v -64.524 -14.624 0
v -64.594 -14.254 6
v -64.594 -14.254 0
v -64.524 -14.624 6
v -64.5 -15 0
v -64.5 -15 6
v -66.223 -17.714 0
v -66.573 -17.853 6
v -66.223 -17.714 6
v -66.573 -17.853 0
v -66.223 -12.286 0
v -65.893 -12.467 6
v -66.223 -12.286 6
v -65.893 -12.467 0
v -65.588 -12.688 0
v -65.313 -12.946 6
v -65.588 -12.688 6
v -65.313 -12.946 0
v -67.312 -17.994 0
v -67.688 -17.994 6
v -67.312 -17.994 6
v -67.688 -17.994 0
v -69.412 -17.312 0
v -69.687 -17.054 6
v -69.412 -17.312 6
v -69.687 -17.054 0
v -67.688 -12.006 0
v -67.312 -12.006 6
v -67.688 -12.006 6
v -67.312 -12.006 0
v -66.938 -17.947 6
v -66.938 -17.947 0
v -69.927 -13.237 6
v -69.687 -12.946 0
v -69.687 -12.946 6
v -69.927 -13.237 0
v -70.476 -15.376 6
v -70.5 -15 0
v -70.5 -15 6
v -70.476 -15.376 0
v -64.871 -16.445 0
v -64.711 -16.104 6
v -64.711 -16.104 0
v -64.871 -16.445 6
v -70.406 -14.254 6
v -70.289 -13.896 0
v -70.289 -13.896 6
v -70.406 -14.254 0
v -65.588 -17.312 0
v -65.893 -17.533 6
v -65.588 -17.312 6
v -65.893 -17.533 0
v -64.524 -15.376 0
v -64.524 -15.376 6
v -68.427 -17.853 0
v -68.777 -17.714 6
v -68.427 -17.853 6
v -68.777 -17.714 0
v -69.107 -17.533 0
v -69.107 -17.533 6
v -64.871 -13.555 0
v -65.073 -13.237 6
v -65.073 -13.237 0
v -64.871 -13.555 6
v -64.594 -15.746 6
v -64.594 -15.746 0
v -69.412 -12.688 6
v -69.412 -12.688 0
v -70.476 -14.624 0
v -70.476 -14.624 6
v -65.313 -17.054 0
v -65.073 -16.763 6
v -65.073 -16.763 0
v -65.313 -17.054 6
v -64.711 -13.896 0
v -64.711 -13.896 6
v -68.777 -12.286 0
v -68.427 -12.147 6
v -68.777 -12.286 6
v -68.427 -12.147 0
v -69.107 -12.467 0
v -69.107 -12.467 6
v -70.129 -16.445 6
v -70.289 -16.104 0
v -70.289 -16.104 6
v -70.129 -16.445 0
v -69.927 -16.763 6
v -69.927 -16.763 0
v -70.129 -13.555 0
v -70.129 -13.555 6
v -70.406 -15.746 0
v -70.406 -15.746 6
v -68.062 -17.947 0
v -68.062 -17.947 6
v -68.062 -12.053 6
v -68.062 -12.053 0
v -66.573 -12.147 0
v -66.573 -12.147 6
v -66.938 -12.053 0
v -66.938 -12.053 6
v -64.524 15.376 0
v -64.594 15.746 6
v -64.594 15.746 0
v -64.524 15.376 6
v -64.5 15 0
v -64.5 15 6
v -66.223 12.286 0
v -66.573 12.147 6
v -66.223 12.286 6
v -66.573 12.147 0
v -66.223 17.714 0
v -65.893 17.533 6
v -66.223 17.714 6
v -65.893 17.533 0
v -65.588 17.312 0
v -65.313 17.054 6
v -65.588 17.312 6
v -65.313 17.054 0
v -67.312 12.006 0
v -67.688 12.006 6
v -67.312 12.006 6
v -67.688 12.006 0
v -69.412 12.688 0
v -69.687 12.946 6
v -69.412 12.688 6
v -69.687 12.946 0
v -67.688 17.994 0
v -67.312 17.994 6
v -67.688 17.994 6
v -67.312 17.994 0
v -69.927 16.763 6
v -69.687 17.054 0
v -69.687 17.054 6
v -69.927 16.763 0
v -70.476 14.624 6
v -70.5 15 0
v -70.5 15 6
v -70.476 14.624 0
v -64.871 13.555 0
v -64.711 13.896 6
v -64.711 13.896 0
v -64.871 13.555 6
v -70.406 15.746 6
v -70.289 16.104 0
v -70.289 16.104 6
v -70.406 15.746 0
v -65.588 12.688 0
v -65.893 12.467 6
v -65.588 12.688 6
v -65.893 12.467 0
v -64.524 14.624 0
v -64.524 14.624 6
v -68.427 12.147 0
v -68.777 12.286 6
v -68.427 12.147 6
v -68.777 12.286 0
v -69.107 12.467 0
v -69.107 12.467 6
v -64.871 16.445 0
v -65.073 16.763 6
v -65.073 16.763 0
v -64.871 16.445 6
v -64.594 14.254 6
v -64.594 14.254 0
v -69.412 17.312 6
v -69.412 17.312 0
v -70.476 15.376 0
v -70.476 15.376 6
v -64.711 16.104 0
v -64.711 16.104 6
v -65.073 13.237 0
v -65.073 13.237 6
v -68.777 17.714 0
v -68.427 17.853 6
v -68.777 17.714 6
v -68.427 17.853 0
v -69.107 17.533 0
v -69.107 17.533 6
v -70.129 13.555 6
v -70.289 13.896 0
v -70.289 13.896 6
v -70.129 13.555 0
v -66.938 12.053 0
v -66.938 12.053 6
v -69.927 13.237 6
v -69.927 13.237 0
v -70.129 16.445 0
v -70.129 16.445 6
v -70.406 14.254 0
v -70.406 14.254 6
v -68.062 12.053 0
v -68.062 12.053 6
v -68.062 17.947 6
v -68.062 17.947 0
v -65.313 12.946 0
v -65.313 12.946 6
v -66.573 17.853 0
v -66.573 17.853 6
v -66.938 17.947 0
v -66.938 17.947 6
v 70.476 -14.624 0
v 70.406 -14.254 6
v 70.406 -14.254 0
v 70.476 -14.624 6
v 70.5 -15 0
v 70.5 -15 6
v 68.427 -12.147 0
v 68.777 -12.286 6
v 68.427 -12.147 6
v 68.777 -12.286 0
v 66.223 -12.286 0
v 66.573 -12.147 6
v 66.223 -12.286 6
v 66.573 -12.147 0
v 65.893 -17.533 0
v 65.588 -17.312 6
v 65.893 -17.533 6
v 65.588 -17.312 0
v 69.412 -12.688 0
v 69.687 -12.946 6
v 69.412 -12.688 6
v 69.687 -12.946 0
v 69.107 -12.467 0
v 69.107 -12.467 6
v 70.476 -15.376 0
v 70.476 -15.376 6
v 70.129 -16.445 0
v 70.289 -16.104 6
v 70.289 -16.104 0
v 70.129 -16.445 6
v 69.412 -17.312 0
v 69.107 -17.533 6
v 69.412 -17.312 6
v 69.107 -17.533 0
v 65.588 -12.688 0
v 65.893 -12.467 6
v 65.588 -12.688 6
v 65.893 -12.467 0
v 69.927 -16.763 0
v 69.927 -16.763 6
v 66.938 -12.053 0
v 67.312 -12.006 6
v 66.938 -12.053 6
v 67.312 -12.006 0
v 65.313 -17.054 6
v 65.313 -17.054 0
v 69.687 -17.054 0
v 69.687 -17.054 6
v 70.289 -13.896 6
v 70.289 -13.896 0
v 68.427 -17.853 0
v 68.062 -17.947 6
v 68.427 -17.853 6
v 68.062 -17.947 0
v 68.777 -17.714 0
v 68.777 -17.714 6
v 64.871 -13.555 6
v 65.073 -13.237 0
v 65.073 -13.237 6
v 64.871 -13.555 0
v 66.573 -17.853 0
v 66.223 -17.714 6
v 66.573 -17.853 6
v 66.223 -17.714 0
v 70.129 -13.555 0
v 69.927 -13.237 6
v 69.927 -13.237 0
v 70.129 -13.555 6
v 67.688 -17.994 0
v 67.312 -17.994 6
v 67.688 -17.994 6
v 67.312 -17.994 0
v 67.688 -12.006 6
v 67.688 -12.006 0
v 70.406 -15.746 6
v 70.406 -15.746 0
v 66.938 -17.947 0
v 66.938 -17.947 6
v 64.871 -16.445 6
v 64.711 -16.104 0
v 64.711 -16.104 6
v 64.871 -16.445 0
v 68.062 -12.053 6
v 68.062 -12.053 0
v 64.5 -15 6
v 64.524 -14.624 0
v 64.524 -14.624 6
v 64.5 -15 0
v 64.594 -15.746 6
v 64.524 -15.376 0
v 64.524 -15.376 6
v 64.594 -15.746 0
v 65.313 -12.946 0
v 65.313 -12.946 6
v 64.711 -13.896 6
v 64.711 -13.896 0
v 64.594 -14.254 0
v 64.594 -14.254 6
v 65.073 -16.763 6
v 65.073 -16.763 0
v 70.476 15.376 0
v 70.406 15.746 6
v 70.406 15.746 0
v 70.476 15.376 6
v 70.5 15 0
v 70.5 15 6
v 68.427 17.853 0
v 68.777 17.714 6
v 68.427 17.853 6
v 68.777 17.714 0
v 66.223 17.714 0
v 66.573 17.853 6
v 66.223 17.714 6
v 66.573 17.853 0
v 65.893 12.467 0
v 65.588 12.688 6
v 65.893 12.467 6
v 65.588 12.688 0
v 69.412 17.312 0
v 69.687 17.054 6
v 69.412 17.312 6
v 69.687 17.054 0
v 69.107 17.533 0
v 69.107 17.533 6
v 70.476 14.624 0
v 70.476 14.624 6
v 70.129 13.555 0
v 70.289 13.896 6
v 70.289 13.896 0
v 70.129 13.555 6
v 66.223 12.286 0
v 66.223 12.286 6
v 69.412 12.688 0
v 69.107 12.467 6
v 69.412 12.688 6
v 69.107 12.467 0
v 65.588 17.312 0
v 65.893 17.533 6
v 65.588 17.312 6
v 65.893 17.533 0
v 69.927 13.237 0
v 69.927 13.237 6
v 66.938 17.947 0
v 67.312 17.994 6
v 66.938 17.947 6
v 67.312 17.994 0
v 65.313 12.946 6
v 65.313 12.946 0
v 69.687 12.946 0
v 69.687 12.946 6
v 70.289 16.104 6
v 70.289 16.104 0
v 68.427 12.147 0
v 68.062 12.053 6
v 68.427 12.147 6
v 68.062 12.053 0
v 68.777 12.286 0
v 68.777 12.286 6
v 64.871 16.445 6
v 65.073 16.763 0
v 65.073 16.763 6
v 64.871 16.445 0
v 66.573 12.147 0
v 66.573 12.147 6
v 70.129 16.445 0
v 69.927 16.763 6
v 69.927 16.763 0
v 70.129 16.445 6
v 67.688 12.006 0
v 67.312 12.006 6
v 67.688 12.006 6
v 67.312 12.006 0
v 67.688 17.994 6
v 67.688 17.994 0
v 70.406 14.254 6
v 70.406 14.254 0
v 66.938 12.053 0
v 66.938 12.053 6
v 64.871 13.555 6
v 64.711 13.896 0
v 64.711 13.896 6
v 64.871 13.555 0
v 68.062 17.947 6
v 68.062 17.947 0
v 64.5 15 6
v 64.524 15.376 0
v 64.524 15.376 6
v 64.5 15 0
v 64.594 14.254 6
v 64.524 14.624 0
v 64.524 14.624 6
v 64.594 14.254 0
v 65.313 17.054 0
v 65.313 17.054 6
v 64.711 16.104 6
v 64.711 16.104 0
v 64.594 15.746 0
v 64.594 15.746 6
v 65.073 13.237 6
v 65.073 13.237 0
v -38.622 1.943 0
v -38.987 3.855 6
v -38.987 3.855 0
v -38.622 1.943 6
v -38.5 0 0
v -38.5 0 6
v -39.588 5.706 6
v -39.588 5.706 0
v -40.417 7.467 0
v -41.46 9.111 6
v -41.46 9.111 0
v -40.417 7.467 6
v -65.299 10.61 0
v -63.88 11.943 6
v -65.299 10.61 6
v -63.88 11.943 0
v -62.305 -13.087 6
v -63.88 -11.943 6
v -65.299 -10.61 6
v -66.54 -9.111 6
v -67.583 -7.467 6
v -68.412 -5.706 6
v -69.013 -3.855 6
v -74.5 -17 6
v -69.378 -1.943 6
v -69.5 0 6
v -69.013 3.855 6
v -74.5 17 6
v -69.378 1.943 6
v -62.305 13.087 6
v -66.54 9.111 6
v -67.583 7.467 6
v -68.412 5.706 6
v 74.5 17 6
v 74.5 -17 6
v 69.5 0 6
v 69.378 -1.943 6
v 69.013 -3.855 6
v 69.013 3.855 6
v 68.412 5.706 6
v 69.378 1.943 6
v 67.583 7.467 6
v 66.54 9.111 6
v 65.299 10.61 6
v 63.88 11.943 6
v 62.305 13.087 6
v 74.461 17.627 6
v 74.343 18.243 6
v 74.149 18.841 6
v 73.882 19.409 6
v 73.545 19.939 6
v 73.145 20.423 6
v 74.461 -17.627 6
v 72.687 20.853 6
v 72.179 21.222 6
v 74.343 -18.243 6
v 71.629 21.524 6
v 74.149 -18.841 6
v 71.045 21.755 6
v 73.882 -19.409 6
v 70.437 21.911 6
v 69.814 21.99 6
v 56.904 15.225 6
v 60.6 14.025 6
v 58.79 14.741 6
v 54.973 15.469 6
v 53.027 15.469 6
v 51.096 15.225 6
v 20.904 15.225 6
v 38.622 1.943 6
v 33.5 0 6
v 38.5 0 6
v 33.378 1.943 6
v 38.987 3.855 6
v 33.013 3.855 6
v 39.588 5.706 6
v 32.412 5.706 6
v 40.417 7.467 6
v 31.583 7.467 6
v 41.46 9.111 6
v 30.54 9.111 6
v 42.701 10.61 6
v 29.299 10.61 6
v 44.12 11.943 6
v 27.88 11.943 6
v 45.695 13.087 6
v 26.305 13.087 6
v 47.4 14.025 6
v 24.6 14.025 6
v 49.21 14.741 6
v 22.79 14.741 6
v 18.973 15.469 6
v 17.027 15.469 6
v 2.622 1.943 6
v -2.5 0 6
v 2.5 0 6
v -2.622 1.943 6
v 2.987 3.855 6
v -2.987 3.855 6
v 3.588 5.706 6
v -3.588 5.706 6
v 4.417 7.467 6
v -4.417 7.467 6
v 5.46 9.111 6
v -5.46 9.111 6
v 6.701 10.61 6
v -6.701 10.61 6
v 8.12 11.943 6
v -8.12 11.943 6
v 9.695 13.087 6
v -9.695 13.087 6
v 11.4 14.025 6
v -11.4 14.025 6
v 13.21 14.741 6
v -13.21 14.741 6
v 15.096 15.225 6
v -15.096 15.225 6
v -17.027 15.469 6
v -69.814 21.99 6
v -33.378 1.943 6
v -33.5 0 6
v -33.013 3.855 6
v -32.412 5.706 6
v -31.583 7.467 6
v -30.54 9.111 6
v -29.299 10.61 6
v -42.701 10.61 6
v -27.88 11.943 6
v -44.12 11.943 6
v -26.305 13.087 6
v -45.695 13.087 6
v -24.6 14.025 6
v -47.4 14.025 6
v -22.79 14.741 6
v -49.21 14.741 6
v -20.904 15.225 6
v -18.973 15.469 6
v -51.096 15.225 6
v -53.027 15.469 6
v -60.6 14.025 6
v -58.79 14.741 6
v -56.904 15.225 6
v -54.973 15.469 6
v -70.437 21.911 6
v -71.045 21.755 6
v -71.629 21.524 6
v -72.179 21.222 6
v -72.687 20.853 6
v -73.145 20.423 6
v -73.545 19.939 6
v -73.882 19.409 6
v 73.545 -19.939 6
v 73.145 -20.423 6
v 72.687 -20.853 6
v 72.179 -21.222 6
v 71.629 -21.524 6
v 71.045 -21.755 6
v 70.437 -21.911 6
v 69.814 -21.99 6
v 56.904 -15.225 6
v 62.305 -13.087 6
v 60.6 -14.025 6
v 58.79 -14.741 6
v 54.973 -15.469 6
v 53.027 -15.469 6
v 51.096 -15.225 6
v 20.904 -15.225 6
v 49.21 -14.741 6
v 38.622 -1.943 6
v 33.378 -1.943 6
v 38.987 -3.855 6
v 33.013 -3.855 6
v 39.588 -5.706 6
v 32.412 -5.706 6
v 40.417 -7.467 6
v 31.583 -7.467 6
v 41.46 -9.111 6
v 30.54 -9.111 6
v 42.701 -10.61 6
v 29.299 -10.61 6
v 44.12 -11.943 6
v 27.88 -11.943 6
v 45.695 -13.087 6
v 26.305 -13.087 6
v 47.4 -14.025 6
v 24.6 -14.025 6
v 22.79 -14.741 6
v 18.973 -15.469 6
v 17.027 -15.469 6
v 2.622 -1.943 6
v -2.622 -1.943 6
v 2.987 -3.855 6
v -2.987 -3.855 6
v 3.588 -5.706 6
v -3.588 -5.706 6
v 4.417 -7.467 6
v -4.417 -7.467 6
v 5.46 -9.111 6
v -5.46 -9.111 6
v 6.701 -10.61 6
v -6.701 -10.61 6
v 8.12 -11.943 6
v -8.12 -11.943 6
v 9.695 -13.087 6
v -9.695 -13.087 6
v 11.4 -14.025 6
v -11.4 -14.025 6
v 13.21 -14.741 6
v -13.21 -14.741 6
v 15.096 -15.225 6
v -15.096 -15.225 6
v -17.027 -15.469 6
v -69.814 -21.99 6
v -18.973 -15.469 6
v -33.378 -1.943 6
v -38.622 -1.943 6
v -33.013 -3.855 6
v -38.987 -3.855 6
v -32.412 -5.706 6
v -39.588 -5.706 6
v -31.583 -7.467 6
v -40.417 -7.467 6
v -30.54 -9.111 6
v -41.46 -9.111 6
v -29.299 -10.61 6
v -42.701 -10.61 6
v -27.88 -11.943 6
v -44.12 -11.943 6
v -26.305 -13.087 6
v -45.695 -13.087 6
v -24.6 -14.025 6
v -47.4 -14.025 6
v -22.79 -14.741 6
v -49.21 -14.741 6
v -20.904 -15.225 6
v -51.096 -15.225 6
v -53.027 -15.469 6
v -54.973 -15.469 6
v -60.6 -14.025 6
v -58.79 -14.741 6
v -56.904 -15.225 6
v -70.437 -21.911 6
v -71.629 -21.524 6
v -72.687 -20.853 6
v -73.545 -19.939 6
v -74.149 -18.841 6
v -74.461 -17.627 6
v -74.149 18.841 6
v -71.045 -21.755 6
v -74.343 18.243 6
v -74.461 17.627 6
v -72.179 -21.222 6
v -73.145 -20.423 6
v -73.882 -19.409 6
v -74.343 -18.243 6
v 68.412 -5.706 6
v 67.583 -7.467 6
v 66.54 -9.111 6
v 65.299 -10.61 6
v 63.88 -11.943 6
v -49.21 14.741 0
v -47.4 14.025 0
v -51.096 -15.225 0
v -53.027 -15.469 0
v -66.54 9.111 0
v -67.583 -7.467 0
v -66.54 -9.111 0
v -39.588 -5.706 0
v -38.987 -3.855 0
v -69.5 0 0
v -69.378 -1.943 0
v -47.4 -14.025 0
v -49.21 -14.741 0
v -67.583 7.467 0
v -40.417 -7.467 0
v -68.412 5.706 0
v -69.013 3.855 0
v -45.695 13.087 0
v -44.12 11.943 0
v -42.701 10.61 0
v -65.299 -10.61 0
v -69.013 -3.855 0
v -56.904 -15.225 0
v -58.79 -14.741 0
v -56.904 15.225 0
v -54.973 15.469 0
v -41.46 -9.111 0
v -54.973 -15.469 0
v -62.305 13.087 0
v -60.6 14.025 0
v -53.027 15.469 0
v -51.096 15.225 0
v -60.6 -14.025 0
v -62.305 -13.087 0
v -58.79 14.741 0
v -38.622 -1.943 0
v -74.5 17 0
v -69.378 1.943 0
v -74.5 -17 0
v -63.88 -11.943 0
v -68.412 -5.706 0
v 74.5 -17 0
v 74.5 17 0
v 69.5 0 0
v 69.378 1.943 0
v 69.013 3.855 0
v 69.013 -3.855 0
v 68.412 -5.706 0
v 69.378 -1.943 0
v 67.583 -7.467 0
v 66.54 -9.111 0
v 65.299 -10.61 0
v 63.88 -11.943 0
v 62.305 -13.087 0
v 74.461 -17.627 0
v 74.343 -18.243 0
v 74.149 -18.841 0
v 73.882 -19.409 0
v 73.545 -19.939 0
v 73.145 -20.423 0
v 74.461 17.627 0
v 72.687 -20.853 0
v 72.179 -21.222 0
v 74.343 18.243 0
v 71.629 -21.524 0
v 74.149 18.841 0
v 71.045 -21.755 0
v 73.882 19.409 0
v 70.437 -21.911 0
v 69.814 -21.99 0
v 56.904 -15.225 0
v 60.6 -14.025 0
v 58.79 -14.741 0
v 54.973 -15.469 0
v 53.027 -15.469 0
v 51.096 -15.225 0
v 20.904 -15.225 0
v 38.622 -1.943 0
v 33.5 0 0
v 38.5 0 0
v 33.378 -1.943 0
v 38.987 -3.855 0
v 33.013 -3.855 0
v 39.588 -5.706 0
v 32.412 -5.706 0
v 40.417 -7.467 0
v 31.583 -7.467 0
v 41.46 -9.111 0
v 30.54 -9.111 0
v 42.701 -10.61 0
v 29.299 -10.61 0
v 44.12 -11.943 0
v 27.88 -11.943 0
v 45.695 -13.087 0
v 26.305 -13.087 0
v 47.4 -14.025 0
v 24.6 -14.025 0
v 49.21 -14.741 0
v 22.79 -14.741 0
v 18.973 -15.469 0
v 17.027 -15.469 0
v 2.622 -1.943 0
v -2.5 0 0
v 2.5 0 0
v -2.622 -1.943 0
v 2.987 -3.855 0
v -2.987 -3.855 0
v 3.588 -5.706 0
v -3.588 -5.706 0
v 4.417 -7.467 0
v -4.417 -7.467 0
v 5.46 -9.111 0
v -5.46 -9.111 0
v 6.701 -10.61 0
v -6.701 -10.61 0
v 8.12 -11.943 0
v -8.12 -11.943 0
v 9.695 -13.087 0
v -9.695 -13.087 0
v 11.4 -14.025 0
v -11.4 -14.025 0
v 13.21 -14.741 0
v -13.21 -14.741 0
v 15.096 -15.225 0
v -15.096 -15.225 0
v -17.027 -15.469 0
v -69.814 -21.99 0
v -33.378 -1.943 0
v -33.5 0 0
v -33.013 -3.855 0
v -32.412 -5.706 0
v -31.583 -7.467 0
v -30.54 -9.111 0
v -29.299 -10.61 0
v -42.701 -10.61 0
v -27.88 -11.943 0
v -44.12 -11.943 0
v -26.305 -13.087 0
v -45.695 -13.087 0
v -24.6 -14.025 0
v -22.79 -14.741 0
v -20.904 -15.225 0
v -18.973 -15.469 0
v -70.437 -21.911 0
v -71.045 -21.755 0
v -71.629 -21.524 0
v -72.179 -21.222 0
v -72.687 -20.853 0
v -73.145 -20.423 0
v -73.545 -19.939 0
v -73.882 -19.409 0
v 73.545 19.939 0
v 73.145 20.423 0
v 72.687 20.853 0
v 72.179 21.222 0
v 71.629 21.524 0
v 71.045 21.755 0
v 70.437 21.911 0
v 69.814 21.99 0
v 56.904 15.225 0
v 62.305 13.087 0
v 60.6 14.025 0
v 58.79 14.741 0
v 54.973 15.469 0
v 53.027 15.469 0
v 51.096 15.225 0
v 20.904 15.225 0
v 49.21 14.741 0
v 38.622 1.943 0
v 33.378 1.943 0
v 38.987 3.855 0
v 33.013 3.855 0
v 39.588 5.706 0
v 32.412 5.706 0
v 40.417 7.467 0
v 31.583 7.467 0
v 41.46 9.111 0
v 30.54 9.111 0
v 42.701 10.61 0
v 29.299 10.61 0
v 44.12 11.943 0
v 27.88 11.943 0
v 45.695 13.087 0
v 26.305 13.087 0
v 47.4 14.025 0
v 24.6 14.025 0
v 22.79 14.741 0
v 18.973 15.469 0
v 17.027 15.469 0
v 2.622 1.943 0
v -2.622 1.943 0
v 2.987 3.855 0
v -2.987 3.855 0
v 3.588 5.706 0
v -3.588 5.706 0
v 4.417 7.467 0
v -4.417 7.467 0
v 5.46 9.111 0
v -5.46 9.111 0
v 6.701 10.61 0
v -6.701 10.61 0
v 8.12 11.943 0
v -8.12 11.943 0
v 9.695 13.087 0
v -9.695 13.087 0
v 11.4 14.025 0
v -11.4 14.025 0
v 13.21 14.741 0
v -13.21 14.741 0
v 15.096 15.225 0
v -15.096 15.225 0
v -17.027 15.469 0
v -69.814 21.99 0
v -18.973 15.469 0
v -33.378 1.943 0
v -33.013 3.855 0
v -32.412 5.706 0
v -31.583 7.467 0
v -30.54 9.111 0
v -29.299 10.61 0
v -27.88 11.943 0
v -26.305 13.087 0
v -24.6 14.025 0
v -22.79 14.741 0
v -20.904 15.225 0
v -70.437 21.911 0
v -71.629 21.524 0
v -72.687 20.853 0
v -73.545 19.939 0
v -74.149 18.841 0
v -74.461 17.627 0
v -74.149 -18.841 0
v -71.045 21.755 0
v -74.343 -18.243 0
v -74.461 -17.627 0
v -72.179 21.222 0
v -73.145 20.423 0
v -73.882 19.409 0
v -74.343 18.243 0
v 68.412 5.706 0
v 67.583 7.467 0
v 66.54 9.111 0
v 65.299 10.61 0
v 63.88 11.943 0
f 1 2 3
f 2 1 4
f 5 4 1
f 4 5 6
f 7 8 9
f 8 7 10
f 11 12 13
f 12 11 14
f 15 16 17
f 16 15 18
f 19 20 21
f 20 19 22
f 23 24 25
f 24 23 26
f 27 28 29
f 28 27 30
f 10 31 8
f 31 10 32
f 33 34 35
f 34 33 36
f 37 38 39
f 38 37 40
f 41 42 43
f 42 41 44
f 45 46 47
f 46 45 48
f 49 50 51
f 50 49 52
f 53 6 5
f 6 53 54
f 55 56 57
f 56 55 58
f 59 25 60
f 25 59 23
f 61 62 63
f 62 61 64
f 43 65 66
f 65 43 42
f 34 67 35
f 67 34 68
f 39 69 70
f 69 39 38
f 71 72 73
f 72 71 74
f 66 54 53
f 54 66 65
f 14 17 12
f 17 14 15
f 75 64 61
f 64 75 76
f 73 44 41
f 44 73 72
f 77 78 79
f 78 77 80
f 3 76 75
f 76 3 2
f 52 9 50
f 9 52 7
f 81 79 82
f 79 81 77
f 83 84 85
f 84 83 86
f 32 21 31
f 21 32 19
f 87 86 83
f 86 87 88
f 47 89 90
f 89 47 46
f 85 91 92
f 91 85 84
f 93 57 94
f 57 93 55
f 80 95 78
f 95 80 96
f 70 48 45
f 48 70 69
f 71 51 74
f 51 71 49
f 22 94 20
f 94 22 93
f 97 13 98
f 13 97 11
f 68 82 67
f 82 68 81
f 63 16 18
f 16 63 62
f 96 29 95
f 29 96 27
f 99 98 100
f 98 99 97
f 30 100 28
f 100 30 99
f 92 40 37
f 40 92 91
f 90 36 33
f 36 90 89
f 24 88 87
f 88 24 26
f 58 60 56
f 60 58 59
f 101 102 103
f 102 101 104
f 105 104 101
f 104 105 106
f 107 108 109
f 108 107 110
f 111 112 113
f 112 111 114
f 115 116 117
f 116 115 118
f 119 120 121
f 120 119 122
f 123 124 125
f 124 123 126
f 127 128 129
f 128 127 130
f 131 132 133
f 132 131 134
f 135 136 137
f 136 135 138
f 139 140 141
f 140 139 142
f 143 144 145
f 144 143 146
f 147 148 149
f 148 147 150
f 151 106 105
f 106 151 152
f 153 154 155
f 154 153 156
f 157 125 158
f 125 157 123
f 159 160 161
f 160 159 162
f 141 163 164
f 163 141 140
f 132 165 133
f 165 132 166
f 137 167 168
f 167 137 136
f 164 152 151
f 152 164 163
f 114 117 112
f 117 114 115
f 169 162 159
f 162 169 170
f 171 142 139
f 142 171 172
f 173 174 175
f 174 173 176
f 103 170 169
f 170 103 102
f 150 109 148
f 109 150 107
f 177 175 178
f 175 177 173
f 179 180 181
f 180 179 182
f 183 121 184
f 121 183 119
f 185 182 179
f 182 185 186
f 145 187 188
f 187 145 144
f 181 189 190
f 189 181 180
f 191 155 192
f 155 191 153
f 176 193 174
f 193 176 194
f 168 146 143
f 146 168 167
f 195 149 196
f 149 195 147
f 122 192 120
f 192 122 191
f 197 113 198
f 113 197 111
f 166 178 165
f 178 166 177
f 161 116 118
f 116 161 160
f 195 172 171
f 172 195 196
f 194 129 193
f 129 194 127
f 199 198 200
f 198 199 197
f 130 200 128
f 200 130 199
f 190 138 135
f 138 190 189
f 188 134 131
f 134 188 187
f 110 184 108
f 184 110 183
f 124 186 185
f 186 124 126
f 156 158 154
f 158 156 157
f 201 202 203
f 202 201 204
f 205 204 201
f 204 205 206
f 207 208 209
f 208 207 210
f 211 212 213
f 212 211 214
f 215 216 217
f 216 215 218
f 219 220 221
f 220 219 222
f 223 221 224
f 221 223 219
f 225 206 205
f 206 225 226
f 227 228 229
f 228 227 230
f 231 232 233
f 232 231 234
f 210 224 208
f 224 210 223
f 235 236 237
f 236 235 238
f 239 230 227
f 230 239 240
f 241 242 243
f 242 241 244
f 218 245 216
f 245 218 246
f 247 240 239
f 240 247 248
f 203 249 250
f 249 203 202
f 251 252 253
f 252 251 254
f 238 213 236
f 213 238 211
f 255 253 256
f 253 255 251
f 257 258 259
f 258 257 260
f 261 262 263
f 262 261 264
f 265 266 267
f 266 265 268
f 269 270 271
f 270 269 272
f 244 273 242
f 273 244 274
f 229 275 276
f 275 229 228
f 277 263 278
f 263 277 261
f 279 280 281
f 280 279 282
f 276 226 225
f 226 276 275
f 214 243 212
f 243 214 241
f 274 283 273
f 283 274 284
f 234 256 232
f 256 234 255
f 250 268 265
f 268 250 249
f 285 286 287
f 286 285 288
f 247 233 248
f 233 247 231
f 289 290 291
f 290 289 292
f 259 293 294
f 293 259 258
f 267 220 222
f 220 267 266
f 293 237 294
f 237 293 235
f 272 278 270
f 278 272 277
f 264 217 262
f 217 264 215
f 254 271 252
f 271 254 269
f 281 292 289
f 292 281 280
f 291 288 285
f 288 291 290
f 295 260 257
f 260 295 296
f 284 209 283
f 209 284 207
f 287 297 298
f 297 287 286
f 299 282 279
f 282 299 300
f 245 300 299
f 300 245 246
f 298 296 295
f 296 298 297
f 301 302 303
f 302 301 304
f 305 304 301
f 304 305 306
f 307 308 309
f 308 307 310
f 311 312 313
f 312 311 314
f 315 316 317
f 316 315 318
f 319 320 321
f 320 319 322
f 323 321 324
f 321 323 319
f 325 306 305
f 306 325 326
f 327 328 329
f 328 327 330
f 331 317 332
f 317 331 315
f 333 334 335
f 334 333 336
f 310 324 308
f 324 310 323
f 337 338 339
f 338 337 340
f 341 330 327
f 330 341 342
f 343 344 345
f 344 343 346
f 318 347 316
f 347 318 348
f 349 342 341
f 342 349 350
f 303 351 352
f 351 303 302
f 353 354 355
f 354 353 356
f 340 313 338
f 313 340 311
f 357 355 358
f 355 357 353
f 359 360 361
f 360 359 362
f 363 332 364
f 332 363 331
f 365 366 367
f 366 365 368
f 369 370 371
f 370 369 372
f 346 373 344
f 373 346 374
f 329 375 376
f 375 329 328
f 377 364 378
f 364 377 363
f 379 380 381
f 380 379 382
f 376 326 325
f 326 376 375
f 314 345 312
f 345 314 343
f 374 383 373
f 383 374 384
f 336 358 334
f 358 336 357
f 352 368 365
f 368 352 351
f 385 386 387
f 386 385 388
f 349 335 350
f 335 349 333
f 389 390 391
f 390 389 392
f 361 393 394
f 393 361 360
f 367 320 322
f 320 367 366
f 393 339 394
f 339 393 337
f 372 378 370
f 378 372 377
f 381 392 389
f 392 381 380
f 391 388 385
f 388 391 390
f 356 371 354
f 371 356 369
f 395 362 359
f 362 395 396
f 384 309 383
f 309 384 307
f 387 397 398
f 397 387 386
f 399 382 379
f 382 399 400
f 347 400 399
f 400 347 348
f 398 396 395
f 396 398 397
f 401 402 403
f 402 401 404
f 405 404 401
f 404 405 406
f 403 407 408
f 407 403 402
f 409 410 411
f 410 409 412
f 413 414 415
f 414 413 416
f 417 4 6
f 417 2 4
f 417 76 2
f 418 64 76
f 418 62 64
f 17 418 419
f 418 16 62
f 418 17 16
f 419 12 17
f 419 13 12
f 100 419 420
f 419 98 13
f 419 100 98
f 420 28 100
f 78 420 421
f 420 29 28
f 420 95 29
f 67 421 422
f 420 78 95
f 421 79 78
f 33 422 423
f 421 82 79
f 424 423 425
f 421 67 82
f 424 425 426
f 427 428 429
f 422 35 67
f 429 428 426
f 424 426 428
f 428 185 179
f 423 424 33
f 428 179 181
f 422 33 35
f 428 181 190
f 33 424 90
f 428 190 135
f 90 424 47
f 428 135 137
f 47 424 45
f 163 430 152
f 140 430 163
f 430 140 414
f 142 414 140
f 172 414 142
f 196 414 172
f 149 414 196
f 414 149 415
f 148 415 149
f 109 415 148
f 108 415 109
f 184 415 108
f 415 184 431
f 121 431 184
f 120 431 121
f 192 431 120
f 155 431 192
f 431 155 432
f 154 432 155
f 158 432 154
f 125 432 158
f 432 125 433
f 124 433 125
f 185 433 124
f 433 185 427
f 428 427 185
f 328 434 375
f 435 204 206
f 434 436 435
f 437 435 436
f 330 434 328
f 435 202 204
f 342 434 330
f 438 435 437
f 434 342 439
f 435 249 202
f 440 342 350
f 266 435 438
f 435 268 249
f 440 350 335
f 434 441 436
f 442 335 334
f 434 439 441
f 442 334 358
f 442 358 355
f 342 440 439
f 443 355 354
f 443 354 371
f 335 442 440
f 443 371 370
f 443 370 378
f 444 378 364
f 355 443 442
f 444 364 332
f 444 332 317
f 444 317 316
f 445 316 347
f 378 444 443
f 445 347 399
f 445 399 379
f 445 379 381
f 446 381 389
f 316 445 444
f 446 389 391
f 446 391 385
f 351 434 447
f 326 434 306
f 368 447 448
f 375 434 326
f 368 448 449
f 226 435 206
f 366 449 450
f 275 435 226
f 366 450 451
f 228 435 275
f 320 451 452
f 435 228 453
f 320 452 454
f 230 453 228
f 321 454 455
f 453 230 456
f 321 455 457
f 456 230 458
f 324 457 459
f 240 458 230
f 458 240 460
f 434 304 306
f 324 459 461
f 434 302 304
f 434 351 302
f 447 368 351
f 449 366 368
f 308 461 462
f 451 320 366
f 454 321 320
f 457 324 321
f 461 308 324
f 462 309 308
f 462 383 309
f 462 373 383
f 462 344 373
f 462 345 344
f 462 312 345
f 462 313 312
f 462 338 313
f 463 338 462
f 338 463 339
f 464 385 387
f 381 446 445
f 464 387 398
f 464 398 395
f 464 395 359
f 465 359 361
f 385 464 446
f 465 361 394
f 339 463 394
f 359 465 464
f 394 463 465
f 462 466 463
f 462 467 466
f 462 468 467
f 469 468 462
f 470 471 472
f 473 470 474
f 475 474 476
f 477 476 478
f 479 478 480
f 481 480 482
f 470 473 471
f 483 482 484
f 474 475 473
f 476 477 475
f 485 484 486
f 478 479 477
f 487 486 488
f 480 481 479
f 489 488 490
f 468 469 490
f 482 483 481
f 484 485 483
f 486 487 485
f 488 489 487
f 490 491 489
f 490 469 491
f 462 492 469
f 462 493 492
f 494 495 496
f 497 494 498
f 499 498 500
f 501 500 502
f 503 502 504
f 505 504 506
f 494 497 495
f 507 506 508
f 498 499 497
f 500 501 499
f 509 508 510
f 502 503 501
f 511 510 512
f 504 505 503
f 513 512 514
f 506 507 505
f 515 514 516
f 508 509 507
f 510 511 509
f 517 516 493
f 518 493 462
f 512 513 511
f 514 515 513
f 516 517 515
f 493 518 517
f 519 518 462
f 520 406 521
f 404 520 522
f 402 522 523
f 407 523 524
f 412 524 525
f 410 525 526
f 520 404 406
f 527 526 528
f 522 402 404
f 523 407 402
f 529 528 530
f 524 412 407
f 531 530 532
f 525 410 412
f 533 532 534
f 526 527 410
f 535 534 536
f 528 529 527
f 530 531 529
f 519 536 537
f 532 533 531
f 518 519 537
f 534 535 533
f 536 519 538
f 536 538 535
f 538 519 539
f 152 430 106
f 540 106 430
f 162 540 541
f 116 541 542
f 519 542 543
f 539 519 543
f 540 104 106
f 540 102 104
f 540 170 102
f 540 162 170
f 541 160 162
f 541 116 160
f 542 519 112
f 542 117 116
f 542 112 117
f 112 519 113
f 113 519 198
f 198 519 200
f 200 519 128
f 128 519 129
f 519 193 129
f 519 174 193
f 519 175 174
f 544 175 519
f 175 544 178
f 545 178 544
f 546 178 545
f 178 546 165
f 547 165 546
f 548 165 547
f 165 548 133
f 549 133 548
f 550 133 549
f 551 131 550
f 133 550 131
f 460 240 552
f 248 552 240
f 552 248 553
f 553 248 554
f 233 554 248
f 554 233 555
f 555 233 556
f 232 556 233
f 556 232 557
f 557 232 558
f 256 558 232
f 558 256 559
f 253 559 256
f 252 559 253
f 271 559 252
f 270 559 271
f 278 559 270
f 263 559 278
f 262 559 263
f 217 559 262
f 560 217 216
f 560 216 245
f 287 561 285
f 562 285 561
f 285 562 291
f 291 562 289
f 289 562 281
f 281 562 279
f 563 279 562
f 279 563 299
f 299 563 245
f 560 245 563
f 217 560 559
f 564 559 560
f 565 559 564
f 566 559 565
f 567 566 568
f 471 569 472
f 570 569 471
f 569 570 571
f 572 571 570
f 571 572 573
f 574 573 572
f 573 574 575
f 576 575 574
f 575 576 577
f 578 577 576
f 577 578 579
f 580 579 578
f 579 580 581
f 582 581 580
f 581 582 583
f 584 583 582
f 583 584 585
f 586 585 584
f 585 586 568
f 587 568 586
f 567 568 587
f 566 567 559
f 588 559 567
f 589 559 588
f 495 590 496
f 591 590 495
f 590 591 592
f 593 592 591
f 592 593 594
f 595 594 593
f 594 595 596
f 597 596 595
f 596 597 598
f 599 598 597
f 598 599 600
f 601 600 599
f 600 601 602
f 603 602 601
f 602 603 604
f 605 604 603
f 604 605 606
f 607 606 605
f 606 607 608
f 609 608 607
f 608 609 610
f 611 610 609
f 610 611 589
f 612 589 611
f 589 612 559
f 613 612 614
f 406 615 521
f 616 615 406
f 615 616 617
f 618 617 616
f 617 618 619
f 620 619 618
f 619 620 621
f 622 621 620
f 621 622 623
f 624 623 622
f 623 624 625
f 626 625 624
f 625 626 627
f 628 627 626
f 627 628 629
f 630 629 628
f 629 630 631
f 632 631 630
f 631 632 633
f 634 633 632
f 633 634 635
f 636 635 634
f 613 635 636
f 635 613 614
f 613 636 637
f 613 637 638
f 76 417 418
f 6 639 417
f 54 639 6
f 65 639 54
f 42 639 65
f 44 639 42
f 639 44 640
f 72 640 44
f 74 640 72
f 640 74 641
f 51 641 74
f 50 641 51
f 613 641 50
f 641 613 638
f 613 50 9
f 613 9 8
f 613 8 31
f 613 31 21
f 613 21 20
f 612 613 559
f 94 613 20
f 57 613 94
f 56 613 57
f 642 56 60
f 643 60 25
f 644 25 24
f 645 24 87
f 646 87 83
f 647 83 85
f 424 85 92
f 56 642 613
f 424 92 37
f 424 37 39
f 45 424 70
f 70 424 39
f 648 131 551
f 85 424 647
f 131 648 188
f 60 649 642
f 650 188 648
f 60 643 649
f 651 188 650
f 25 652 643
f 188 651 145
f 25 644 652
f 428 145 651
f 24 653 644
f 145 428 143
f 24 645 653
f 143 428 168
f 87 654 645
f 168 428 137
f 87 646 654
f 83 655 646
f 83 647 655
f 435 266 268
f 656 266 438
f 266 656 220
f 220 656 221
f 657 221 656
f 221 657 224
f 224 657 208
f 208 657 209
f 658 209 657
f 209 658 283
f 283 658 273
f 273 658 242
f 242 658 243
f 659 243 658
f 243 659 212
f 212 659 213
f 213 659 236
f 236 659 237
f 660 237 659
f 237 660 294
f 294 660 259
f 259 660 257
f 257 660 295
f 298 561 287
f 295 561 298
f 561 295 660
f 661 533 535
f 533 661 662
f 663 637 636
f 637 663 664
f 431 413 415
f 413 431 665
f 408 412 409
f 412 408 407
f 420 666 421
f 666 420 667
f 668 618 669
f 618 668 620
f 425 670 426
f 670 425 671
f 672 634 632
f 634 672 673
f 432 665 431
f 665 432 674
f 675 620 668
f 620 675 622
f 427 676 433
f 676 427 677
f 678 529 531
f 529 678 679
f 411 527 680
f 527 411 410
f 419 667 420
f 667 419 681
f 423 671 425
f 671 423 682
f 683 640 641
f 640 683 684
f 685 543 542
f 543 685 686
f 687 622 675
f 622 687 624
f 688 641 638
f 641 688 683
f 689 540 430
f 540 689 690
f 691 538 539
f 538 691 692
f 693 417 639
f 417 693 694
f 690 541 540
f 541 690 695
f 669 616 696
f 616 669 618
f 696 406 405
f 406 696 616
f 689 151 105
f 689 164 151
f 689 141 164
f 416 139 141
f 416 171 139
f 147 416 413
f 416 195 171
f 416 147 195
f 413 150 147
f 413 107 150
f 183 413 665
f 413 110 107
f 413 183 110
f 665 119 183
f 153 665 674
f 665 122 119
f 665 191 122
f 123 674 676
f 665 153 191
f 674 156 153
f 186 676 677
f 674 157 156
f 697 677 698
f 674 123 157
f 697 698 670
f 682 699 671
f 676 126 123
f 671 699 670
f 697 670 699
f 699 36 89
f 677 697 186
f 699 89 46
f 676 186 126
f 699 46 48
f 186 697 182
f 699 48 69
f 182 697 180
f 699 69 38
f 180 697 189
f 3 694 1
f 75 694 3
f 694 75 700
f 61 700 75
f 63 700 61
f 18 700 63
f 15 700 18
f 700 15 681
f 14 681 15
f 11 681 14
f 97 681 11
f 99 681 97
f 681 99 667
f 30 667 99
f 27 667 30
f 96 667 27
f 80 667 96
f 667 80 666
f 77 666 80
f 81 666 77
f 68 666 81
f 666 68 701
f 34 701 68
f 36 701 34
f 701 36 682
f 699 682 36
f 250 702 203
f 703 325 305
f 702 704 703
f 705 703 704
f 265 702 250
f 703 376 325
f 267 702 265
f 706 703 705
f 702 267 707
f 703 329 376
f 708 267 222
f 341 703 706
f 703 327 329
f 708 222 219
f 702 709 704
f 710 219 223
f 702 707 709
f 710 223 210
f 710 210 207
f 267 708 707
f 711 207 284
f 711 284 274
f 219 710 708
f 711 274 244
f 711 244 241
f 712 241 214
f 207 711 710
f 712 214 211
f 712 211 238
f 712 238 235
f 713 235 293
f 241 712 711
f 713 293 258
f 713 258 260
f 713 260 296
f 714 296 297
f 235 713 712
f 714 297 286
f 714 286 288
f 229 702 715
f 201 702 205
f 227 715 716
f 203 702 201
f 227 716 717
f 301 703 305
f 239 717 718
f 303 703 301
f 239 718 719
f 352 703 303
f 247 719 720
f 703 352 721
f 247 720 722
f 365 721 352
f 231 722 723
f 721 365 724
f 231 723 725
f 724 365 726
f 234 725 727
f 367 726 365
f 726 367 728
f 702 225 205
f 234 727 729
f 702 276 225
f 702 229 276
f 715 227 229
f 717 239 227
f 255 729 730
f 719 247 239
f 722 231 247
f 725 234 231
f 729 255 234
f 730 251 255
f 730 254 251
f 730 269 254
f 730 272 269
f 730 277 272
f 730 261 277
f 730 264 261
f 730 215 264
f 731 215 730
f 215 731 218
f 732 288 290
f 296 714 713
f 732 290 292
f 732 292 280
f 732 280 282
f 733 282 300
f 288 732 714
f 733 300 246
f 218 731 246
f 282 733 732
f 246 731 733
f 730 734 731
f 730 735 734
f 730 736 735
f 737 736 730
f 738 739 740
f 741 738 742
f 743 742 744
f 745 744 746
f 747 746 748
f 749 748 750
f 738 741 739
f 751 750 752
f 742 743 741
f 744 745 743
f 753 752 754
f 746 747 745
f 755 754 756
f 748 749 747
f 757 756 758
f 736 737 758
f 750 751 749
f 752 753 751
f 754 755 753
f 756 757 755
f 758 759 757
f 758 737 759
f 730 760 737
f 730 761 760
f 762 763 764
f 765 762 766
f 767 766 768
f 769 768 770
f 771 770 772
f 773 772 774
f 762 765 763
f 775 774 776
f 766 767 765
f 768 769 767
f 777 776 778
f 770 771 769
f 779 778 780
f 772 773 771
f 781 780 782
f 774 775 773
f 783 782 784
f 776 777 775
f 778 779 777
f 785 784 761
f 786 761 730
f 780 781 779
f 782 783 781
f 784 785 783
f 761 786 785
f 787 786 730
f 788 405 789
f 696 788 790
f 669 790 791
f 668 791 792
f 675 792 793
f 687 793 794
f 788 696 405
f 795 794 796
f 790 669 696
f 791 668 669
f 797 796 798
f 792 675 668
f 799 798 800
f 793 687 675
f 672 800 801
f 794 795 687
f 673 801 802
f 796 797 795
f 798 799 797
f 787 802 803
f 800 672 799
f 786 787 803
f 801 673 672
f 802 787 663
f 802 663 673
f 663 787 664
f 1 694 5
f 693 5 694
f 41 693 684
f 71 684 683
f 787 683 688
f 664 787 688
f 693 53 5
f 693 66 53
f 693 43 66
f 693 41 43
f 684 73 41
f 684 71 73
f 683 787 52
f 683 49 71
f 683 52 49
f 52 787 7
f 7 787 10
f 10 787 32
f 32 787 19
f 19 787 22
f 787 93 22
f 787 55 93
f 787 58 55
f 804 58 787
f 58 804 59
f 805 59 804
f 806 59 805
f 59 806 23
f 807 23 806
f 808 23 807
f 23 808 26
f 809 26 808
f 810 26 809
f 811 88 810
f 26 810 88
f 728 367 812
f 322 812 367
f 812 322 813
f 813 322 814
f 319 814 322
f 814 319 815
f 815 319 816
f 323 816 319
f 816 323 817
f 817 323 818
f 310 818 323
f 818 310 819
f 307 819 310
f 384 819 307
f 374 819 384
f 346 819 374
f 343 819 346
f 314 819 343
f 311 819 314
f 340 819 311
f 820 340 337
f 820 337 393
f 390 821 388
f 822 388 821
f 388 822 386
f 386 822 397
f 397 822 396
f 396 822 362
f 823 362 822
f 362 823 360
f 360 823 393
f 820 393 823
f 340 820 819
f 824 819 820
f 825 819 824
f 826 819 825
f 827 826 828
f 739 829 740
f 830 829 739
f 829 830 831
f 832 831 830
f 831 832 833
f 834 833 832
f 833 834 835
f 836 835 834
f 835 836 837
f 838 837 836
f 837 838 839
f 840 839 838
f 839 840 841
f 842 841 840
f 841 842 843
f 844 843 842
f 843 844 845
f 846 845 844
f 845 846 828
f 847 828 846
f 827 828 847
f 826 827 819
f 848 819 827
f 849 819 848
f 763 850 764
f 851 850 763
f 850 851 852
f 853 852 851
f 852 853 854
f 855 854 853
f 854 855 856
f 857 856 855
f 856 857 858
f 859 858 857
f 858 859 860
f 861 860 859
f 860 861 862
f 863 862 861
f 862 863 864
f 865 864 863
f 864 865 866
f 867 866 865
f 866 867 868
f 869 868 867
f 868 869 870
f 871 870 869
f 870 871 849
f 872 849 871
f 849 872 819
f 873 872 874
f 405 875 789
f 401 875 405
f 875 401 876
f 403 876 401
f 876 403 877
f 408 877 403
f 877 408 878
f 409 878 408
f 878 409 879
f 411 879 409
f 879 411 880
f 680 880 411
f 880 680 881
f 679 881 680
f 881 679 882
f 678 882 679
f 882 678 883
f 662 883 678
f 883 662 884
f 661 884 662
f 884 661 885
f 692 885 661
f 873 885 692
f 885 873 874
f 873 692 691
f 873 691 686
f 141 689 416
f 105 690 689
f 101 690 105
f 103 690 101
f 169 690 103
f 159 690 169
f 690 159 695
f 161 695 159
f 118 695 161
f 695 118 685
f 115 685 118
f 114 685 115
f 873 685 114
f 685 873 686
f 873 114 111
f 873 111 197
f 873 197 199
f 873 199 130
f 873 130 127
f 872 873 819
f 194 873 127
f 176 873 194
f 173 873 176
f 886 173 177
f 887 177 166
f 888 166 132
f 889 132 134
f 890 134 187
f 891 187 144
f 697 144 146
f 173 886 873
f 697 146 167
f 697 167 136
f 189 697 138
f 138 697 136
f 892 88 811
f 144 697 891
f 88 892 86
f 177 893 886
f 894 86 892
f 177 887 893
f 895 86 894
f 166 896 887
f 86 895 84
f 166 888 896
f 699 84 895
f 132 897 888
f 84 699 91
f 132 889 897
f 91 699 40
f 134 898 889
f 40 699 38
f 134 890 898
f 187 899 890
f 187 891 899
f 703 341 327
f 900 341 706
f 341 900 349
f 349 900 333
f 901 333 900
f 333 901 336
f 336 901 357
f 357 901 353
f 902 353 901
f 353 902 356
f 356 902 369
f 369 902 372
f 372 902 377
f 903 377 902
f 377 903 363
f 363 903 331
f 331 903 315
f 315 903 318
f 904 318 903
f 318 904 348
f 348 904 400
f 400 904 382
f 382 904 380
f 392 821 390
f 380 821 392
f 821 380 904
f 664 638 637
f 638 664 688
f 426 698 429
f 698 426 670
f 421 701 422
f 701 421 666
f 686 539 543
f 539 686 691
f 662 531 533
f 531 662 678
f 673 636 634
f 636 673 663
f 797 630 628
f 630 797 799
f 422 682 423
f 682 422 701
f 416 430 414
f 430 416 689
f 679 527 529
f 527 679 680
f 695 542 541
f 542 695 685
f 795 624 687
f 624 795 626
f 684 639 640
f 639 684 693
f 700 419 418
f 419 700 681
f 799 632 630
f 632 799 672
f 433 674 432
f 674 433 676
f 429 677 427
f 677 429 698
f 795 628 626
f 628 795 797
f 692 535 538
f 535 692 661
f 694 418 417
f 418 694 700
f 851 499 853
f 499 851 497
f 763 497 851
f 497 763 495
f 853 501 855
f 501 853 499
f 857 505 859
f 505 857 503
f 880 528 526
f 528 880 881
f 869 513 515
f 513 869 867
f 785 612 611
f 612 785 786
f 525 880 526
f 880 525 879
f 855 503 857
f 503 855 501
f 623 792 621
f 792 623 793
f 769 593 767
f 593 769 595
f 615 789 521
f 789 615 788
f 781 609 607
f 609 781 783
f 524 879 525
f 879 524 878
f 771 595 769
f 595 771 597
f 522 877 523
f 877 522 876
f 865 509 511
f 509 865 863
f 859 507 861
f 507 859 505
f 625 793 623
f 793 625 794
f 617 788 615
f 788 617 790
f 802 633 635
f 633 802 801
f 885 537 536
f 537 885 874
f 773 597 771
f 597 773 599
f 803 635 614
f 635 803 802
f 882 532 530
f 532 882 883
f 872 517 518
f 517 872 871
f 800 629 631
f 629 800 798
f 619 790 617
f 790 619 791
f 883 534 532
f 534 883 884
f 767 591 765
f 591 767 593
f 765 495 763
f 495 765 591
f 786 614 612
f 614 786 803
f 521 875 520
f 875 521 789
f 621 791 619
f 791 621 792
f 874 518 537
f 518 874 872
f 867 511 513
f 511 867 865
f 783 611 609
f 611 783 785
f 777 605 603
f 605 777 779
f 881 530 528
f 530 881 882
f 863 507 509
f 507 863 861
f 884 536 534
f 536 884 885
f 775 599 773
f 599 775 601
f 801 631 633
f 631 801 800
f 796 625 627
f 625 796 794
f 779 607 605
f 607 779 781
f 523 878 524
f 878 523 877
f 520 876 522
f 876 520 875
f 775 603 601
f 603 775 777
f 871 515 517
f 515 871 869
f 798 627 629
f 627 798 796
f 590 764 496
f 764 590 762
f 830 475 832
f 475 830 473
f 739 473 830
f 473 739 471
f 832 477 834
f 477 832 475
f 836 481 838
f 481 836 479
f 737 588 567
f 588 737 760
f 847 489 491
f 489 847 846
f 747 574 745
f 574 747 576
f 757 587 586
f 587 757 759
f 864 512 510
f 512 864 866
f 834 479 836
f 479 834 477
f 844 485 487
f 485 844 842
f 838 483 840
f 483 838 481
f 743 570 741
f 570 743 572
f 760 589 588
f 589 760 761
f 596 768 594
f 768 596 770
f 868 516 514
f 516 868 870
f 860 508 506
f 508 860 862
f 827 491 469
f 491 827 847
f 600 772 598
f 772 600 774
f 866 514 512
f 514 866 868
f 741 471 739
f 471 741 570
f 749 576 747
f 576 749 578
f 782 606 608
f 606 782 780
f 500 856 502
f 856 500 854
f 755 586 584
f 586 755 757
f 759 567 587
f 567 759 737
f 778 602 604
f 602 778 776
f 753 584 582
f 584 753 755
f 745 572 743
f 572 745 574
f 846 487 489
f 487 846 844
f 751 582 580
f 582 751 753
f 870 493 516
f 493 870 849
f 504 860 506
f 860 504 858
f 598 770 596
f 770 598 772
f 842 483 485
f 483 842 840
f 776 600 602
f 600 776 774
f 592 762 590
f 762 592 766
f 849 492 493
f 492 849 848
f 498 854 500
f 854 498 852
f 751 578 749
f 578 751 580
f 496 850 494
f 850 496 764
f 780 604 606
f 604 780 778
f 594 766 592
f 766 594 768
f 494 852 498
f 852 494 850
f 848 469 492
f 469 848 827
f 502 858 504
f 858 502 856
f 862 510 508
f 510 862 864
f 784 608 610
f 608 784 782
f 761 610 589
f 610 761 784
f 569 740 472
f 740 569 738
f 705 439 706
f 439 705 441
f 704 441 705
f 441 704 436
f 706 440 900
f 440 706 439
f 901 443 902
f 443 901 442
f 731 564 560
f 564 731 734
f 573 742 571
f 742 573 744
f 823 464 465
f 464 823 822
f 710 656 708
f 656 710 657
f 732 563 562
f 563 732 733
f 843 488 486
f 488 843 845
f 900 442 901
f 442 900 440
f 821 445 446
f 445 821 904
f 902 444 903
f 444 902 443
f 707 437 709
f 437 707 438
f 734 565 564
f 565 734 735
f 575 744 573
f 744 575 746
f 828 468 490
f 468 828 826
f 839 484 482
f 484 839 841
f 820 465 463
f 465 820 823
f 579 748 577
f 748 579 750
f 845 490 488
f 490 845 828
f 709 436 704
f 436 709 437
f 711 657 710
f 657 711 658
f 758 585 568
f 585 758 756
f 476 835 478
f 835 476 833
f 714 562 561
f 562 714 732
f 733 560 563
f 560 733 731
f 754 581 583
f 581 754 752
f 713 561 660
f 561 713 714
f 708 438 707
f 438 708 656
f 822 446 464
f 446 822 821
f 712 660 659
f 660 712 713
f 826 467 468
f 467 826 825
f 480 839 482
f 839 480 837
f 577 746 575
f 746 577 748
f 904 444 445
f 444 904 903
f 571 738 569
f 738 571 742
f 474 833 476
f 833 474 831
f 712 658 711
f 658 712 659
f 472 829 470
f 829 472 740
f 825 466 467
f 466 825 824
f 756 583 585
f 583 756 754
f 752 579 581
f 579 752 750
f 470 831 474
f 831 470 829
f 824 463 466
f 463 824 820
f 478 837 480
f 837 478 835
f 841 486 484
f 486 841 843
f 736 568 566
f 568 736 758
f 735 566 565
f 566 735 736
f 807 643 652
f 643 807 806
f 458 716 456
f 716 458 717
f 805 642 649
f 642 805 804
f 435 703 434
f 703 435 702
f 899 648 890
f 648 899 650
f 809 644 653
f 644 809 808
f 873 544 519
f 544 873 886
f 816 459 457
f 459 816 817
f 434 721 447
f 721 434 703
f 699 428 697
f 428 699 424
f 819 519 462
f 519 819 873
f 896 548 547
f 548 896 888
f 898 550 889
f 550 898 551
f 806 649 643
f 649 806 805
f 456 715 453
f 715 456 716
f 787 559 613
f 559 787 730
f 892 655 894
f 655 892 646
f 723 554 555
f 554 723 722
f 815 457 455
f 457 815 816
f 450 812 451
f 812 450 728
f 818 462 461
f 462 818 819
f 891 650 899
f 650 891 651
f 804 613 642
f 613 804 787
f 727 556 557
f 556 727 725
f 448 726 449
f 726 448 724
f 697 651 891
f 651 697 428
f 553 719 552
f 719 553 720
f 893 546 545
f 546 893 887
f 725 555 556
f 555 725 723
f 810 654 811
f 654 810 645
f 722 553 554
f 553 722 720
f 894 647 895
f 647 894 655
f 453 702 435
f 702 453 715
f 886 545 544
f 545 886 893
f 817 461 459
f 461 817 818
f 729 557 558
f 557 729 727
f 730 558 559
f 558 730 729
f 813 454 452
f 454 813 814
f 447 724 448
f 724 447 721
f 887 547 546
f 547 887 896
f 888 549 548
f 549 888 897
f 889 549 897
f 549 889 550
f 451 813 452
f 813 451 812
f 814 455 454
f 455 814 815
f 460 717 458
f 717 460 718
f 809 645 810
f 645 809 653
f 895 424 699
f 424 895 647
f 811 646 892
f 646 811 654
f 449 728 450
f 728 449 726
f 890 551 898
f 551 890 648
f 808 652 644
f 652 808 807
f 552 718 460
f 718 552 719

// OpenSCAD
$fn = 50;


difference() {
	union() {
		hull() {
			translate(v = [-69.5000000000, 17.0000000000, 0]) {
				cylinder(h = 6, r = 5);
			}
			translate(v = [69.5000000000, 17.0000000000, 0]) {
				cylinder(h = 6, r = 5);
			}
			translate(v = [-69.5000000000, -17.0000000000, 0]) {
				cylinder(h = 6, r = 5);
			}
			translate(v = [69.5000000000, -17.0000000000, 0]) {
				cylinder(h = 6, r = 5);
			}
		}
	}
	union() {
		#translate(v = [-67.5000000000, -15.0000000000, -100.0000000000]) {
			cylinder(h = 200, r = 3.0000000000);
		}
		#translate(v = [-67.5000000000, 15.0000000000, -100.0000000000]) {
			cylinder(h = 200, r = 3.0000000000);
		}
		#translate(v = [67.5000000000, -15.0000000000, -100.0000000000]) {
			cylinder(h = 200, r = 3.0000000000);
		}
		#translate(v = [67.5000000000, 15.0000000000, -100.0000000000]) {
			cylinder(h = 200, r = 3.0000000000);
		}
		#translate(v = [-54.0000000000, 0, 0]) {
			cylinder(h = 6, r = 15.5000000000);
		}
		#translate(v = [-18.0000000000, 0, 0]) {
			cylinder(h = 6, r = 15.5000000000);
		}
		#translate(v = [18.0000000000, 0, 0]) {
			cylinder(h = 6, r = 15.5000000000);
		}
		#translate(v = [54.0000000000, 0, 0]) {
			cylinder(h = 6, r = 15.5000000000);
		}
	}
}
